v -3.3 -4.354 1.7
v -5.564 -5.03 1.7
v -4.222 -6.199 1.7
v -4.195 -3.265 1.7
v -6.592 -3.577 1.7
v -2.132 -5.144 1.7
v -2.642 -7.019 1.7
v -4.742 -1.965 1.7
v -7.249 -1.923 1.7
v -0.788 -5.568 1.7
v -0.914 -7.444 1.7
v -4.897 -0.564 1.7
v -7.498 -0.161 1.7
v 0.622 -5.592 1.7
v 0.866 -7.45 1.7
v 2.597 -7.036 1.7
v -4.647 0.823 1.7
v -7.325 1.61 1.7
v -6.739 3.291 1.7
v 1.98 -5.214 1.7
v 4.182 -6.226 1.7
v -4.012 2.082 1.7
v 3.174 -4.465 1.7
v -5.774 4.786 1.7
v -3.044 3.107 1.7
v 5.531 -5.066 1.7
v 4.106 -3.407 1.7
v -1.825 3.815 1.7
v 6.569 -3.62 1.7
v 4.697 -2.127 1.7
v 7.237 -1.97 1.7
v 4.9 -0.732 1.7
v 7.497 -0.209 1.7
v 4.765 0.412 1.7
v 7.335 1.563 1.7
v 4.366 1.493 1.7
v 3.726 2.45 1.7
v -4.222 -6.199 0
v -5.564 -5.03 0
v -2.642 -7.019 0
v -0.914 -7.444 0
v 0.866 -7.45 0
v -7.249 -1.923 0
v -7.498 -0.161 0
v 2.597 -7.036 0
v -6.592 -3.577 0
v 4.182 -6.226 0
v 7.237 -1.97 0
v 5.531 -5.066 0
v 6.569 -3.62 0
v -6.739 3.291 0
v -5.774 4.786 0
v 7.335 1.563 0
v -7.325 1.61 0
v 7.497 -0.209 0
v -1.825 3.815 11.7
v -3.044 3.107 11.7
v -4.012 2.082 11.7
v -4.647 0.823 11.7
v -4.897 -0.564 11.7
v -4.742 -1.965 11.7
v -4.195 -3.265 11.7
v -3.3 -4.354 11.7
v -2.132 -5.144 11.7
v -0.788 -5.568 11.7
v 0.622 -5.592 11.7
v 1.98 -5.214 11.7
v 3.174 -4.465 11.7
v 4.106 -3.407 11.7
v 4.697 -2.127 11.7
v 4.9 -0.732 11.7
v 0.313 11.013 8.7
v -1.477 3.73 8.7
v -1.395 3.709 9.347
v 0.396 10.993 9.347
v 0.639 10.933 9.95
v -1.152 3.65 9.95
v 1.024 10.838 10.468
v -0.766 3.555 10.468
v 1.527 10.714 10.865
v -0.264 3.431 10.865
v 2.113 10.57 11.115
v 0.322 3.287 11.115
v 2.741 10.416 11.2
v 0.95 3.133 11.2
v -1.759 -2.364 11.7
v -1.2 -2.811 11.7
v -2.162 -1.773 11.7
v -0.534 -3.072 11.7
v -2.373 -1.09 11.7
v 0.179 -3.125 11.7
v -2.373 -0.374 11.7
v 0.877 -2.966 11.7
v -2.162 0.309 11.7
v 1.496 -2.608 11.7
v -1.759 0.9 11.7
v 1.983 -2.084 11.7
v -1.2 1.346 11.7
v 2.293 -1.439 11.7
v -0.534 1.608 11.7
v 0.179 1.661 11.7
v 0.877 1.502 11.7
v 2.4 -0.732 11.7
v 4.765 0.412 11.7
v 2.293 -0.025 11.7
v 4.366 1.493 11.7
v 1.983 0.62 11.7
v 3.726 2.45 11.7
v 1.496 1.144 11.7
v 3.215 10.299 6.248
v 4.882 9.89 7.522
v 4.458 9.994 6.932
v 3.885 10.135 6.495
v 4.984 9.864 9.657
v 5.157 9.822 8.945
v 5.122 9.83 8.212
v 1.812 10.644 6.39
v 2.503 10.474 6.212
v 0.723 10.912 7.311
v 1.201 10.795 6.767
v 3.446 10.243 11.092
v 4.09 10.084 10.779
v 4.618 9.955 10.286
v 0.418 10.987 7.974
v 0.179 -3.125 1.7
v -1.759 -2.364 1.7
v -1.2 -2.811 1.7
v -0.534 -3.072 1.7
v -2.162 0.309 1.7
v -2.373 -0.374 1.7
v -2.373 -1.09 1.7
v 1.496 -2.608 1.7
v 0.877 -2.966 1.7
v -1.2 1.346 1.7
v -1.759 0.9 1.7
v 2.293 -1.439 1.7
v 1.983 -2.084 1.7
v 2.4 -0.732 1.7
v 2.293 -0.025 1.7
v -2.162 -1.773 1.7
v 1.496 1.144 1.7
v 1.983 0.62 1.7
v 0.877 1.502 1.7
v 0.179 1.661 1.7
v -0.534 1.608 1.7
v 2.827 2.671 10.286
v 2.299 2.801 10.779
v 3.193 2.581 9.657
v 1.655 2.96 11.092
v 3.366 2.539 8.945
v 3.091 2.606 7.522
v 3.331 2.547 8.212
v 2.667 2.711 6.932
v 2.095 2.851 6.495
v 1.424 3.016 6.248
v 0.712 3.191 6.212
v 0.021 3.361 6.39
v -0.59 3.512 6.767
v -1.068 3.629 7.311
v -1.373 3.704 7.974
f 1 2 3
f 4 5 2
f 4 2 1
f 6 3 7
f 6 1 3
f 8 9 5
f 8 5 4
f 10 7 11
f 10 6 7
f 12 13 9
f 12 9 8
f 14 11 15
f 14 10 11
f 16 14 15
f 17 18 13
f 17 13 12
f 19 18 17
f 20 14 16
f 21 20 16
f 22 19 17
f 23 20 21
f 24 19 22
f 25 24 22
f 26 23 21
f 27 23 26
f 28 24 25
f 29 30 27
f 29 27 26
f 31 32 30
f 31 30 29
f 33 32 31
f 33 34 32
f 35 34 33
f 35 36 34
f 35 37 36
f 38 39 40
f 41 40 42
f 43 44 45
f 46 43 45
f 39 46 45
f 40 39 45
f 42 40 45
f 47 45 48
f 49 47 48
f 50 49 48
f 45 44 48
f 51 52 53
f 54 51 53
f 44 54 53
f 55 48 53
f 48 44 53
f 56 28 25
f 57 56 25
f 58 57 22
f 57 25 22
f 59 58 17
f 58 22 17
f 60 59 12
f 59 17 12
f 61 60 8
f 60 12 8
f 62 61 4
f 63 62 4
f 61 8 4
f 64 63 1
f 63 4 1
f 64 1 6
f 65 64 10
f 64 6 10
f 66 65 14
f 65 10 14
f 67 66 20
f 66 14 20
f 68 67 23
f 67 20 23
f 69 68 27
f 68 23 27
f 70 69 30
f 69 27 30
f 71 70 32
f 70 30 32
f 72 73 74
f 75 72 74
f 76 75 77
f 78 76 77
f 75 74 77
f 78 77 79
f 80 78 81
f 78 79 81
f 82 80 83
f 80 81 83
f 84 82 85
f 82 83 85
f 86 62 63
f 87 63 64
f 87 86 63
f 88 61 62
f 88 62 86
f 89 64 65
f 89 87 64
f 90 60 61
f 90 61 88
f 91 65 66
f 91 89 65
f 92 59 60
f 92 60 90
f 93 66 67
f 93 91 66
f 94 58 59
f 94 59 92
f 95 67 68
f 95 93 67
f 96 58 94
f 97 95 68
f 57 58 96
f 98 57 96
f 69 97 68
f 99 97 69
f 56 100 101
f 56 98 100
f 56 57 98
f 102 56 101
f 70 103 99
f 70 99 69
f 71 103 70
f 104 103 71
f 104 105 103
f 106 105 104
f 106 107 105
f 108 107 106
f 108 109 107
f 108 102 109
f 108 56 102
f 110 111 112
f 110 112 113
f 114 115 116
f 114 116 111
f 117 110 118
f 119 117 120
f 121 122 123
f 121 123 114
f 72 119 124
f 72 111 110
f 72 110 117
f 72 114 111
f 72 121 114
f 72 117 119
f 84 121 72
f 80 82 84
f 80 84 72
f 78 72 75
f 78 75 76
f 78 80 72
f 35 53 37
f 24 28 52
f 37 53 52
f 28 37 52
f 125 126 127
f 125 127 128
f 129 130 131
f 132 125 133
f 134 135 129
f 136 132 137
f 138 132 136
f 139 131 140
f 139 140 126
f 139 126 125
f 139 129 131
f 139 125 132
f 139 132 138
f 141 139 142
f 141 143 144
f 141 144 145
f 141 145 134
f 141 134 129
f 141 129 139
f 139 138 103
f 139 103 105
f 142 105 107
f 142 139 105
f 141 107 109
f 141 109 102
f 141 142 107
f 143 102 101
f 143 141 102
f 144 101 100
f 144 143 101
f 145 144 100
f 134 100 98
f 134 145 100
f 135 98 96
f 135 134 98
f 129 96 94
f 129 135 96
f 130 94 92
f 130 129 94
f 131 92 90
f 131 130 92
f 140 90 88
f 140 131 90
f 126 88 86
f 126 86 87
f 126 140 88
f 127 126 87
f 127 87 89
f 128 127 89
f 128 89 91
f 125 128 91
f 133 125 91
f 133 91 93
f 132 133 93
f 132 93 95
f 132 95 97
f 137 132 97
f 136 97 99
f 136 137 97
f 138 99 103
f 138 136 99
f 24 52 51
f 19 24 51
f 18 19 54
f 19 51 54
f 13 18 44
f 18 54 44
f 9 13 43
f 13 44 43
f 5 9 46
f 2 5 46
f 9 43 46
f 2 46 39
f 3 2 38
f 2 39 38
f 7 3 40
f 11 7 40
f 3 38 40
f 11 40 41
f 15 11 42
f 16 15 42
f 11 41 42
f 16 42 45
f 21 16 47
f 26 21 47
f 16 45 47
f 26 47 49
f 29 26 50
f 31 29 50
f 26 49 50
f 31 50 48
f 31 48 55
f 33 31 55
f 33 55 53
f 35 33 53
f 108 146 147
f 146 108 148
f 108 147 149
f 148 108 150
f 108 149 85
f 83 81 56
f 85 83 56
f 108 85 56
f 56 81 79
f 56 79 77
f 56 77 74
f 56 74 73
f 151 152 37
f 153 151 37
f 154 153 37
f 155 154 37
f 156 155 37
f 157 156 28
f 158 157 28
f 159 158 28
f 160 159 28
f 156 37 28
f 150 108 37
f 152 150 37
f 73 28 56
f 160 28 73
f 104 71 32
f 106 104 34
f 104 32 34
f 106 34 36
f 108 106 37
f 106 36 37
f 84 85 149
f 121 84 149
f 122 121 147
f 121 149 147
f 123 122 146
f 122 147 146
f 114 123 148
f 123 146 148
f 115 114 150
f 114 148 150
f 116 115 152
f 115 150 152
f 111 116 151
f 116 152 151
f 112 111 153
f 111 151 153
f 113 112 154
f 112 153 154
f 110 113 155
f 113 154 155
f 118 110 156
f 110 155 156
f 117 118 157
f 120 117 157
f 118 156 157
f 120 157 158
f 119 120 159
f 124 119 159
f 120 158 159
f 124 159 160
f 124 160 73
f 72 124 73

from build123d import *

# Parameters (mm, degrees)
F1_DEPTH = 1.7
F2_R     = 2.4
F3_DEPTH = 10
F5_DEPTH = 7.5


with BuildPart() as f1:
    # F0 (on Top) → F1 (new body)
    with BuildSketch(Plane.XY):
        with BuildLine():
            Line((7.335345, 1.562919), (-5.774183, 4.786315))
            ThreePointArc((-5.774183, 4.786315), (-1.790775, -7.283071), (7.335345, 1.562919))
        make_face()
    extrude(amount=F1_DEPTH)

    # F2 (on face) → F3 (join)
    with BuildSketch(Plane.XY.offset(1.7)):
        with BuildLine():
            ThreePointArc((-1.825206, 3.815333), (-2.744676, -4.791199), (4.9, -0.732042))
            ThreePointArc((4.9, -0.732042), (4.597097, 0.964042), (3.725836, 2.450432))
            Line((3.725836, 2.450432), (-1.825206, 3.815333))
        make_face()
        with Locations((0, -0.732042)):
            Circle(F2_R, mode=Mode.SUBTRACT)
    extrude(amount=F3_DEPTH)

    # F4 (on face) → F5 (join)
    with BuildSketch(Plane(origin=(0.780581, 3.174617, 0), x_dir=(-0.971076, 0.23877, 0), z_dir=(0.23877, 0.971076, 0))):
        with BuildLine():
            ThreePointArc((2.32521, 8.7), (1.592977, 10.467767), (-0.17479, 11.2))
            ThreePointArc((-0.17479, 11.2), (-1.942557, 6.932233), (2.32521, 8.7))
        make_face()
    extrude(amount=F5_DEPTH)


solid = f1.part
